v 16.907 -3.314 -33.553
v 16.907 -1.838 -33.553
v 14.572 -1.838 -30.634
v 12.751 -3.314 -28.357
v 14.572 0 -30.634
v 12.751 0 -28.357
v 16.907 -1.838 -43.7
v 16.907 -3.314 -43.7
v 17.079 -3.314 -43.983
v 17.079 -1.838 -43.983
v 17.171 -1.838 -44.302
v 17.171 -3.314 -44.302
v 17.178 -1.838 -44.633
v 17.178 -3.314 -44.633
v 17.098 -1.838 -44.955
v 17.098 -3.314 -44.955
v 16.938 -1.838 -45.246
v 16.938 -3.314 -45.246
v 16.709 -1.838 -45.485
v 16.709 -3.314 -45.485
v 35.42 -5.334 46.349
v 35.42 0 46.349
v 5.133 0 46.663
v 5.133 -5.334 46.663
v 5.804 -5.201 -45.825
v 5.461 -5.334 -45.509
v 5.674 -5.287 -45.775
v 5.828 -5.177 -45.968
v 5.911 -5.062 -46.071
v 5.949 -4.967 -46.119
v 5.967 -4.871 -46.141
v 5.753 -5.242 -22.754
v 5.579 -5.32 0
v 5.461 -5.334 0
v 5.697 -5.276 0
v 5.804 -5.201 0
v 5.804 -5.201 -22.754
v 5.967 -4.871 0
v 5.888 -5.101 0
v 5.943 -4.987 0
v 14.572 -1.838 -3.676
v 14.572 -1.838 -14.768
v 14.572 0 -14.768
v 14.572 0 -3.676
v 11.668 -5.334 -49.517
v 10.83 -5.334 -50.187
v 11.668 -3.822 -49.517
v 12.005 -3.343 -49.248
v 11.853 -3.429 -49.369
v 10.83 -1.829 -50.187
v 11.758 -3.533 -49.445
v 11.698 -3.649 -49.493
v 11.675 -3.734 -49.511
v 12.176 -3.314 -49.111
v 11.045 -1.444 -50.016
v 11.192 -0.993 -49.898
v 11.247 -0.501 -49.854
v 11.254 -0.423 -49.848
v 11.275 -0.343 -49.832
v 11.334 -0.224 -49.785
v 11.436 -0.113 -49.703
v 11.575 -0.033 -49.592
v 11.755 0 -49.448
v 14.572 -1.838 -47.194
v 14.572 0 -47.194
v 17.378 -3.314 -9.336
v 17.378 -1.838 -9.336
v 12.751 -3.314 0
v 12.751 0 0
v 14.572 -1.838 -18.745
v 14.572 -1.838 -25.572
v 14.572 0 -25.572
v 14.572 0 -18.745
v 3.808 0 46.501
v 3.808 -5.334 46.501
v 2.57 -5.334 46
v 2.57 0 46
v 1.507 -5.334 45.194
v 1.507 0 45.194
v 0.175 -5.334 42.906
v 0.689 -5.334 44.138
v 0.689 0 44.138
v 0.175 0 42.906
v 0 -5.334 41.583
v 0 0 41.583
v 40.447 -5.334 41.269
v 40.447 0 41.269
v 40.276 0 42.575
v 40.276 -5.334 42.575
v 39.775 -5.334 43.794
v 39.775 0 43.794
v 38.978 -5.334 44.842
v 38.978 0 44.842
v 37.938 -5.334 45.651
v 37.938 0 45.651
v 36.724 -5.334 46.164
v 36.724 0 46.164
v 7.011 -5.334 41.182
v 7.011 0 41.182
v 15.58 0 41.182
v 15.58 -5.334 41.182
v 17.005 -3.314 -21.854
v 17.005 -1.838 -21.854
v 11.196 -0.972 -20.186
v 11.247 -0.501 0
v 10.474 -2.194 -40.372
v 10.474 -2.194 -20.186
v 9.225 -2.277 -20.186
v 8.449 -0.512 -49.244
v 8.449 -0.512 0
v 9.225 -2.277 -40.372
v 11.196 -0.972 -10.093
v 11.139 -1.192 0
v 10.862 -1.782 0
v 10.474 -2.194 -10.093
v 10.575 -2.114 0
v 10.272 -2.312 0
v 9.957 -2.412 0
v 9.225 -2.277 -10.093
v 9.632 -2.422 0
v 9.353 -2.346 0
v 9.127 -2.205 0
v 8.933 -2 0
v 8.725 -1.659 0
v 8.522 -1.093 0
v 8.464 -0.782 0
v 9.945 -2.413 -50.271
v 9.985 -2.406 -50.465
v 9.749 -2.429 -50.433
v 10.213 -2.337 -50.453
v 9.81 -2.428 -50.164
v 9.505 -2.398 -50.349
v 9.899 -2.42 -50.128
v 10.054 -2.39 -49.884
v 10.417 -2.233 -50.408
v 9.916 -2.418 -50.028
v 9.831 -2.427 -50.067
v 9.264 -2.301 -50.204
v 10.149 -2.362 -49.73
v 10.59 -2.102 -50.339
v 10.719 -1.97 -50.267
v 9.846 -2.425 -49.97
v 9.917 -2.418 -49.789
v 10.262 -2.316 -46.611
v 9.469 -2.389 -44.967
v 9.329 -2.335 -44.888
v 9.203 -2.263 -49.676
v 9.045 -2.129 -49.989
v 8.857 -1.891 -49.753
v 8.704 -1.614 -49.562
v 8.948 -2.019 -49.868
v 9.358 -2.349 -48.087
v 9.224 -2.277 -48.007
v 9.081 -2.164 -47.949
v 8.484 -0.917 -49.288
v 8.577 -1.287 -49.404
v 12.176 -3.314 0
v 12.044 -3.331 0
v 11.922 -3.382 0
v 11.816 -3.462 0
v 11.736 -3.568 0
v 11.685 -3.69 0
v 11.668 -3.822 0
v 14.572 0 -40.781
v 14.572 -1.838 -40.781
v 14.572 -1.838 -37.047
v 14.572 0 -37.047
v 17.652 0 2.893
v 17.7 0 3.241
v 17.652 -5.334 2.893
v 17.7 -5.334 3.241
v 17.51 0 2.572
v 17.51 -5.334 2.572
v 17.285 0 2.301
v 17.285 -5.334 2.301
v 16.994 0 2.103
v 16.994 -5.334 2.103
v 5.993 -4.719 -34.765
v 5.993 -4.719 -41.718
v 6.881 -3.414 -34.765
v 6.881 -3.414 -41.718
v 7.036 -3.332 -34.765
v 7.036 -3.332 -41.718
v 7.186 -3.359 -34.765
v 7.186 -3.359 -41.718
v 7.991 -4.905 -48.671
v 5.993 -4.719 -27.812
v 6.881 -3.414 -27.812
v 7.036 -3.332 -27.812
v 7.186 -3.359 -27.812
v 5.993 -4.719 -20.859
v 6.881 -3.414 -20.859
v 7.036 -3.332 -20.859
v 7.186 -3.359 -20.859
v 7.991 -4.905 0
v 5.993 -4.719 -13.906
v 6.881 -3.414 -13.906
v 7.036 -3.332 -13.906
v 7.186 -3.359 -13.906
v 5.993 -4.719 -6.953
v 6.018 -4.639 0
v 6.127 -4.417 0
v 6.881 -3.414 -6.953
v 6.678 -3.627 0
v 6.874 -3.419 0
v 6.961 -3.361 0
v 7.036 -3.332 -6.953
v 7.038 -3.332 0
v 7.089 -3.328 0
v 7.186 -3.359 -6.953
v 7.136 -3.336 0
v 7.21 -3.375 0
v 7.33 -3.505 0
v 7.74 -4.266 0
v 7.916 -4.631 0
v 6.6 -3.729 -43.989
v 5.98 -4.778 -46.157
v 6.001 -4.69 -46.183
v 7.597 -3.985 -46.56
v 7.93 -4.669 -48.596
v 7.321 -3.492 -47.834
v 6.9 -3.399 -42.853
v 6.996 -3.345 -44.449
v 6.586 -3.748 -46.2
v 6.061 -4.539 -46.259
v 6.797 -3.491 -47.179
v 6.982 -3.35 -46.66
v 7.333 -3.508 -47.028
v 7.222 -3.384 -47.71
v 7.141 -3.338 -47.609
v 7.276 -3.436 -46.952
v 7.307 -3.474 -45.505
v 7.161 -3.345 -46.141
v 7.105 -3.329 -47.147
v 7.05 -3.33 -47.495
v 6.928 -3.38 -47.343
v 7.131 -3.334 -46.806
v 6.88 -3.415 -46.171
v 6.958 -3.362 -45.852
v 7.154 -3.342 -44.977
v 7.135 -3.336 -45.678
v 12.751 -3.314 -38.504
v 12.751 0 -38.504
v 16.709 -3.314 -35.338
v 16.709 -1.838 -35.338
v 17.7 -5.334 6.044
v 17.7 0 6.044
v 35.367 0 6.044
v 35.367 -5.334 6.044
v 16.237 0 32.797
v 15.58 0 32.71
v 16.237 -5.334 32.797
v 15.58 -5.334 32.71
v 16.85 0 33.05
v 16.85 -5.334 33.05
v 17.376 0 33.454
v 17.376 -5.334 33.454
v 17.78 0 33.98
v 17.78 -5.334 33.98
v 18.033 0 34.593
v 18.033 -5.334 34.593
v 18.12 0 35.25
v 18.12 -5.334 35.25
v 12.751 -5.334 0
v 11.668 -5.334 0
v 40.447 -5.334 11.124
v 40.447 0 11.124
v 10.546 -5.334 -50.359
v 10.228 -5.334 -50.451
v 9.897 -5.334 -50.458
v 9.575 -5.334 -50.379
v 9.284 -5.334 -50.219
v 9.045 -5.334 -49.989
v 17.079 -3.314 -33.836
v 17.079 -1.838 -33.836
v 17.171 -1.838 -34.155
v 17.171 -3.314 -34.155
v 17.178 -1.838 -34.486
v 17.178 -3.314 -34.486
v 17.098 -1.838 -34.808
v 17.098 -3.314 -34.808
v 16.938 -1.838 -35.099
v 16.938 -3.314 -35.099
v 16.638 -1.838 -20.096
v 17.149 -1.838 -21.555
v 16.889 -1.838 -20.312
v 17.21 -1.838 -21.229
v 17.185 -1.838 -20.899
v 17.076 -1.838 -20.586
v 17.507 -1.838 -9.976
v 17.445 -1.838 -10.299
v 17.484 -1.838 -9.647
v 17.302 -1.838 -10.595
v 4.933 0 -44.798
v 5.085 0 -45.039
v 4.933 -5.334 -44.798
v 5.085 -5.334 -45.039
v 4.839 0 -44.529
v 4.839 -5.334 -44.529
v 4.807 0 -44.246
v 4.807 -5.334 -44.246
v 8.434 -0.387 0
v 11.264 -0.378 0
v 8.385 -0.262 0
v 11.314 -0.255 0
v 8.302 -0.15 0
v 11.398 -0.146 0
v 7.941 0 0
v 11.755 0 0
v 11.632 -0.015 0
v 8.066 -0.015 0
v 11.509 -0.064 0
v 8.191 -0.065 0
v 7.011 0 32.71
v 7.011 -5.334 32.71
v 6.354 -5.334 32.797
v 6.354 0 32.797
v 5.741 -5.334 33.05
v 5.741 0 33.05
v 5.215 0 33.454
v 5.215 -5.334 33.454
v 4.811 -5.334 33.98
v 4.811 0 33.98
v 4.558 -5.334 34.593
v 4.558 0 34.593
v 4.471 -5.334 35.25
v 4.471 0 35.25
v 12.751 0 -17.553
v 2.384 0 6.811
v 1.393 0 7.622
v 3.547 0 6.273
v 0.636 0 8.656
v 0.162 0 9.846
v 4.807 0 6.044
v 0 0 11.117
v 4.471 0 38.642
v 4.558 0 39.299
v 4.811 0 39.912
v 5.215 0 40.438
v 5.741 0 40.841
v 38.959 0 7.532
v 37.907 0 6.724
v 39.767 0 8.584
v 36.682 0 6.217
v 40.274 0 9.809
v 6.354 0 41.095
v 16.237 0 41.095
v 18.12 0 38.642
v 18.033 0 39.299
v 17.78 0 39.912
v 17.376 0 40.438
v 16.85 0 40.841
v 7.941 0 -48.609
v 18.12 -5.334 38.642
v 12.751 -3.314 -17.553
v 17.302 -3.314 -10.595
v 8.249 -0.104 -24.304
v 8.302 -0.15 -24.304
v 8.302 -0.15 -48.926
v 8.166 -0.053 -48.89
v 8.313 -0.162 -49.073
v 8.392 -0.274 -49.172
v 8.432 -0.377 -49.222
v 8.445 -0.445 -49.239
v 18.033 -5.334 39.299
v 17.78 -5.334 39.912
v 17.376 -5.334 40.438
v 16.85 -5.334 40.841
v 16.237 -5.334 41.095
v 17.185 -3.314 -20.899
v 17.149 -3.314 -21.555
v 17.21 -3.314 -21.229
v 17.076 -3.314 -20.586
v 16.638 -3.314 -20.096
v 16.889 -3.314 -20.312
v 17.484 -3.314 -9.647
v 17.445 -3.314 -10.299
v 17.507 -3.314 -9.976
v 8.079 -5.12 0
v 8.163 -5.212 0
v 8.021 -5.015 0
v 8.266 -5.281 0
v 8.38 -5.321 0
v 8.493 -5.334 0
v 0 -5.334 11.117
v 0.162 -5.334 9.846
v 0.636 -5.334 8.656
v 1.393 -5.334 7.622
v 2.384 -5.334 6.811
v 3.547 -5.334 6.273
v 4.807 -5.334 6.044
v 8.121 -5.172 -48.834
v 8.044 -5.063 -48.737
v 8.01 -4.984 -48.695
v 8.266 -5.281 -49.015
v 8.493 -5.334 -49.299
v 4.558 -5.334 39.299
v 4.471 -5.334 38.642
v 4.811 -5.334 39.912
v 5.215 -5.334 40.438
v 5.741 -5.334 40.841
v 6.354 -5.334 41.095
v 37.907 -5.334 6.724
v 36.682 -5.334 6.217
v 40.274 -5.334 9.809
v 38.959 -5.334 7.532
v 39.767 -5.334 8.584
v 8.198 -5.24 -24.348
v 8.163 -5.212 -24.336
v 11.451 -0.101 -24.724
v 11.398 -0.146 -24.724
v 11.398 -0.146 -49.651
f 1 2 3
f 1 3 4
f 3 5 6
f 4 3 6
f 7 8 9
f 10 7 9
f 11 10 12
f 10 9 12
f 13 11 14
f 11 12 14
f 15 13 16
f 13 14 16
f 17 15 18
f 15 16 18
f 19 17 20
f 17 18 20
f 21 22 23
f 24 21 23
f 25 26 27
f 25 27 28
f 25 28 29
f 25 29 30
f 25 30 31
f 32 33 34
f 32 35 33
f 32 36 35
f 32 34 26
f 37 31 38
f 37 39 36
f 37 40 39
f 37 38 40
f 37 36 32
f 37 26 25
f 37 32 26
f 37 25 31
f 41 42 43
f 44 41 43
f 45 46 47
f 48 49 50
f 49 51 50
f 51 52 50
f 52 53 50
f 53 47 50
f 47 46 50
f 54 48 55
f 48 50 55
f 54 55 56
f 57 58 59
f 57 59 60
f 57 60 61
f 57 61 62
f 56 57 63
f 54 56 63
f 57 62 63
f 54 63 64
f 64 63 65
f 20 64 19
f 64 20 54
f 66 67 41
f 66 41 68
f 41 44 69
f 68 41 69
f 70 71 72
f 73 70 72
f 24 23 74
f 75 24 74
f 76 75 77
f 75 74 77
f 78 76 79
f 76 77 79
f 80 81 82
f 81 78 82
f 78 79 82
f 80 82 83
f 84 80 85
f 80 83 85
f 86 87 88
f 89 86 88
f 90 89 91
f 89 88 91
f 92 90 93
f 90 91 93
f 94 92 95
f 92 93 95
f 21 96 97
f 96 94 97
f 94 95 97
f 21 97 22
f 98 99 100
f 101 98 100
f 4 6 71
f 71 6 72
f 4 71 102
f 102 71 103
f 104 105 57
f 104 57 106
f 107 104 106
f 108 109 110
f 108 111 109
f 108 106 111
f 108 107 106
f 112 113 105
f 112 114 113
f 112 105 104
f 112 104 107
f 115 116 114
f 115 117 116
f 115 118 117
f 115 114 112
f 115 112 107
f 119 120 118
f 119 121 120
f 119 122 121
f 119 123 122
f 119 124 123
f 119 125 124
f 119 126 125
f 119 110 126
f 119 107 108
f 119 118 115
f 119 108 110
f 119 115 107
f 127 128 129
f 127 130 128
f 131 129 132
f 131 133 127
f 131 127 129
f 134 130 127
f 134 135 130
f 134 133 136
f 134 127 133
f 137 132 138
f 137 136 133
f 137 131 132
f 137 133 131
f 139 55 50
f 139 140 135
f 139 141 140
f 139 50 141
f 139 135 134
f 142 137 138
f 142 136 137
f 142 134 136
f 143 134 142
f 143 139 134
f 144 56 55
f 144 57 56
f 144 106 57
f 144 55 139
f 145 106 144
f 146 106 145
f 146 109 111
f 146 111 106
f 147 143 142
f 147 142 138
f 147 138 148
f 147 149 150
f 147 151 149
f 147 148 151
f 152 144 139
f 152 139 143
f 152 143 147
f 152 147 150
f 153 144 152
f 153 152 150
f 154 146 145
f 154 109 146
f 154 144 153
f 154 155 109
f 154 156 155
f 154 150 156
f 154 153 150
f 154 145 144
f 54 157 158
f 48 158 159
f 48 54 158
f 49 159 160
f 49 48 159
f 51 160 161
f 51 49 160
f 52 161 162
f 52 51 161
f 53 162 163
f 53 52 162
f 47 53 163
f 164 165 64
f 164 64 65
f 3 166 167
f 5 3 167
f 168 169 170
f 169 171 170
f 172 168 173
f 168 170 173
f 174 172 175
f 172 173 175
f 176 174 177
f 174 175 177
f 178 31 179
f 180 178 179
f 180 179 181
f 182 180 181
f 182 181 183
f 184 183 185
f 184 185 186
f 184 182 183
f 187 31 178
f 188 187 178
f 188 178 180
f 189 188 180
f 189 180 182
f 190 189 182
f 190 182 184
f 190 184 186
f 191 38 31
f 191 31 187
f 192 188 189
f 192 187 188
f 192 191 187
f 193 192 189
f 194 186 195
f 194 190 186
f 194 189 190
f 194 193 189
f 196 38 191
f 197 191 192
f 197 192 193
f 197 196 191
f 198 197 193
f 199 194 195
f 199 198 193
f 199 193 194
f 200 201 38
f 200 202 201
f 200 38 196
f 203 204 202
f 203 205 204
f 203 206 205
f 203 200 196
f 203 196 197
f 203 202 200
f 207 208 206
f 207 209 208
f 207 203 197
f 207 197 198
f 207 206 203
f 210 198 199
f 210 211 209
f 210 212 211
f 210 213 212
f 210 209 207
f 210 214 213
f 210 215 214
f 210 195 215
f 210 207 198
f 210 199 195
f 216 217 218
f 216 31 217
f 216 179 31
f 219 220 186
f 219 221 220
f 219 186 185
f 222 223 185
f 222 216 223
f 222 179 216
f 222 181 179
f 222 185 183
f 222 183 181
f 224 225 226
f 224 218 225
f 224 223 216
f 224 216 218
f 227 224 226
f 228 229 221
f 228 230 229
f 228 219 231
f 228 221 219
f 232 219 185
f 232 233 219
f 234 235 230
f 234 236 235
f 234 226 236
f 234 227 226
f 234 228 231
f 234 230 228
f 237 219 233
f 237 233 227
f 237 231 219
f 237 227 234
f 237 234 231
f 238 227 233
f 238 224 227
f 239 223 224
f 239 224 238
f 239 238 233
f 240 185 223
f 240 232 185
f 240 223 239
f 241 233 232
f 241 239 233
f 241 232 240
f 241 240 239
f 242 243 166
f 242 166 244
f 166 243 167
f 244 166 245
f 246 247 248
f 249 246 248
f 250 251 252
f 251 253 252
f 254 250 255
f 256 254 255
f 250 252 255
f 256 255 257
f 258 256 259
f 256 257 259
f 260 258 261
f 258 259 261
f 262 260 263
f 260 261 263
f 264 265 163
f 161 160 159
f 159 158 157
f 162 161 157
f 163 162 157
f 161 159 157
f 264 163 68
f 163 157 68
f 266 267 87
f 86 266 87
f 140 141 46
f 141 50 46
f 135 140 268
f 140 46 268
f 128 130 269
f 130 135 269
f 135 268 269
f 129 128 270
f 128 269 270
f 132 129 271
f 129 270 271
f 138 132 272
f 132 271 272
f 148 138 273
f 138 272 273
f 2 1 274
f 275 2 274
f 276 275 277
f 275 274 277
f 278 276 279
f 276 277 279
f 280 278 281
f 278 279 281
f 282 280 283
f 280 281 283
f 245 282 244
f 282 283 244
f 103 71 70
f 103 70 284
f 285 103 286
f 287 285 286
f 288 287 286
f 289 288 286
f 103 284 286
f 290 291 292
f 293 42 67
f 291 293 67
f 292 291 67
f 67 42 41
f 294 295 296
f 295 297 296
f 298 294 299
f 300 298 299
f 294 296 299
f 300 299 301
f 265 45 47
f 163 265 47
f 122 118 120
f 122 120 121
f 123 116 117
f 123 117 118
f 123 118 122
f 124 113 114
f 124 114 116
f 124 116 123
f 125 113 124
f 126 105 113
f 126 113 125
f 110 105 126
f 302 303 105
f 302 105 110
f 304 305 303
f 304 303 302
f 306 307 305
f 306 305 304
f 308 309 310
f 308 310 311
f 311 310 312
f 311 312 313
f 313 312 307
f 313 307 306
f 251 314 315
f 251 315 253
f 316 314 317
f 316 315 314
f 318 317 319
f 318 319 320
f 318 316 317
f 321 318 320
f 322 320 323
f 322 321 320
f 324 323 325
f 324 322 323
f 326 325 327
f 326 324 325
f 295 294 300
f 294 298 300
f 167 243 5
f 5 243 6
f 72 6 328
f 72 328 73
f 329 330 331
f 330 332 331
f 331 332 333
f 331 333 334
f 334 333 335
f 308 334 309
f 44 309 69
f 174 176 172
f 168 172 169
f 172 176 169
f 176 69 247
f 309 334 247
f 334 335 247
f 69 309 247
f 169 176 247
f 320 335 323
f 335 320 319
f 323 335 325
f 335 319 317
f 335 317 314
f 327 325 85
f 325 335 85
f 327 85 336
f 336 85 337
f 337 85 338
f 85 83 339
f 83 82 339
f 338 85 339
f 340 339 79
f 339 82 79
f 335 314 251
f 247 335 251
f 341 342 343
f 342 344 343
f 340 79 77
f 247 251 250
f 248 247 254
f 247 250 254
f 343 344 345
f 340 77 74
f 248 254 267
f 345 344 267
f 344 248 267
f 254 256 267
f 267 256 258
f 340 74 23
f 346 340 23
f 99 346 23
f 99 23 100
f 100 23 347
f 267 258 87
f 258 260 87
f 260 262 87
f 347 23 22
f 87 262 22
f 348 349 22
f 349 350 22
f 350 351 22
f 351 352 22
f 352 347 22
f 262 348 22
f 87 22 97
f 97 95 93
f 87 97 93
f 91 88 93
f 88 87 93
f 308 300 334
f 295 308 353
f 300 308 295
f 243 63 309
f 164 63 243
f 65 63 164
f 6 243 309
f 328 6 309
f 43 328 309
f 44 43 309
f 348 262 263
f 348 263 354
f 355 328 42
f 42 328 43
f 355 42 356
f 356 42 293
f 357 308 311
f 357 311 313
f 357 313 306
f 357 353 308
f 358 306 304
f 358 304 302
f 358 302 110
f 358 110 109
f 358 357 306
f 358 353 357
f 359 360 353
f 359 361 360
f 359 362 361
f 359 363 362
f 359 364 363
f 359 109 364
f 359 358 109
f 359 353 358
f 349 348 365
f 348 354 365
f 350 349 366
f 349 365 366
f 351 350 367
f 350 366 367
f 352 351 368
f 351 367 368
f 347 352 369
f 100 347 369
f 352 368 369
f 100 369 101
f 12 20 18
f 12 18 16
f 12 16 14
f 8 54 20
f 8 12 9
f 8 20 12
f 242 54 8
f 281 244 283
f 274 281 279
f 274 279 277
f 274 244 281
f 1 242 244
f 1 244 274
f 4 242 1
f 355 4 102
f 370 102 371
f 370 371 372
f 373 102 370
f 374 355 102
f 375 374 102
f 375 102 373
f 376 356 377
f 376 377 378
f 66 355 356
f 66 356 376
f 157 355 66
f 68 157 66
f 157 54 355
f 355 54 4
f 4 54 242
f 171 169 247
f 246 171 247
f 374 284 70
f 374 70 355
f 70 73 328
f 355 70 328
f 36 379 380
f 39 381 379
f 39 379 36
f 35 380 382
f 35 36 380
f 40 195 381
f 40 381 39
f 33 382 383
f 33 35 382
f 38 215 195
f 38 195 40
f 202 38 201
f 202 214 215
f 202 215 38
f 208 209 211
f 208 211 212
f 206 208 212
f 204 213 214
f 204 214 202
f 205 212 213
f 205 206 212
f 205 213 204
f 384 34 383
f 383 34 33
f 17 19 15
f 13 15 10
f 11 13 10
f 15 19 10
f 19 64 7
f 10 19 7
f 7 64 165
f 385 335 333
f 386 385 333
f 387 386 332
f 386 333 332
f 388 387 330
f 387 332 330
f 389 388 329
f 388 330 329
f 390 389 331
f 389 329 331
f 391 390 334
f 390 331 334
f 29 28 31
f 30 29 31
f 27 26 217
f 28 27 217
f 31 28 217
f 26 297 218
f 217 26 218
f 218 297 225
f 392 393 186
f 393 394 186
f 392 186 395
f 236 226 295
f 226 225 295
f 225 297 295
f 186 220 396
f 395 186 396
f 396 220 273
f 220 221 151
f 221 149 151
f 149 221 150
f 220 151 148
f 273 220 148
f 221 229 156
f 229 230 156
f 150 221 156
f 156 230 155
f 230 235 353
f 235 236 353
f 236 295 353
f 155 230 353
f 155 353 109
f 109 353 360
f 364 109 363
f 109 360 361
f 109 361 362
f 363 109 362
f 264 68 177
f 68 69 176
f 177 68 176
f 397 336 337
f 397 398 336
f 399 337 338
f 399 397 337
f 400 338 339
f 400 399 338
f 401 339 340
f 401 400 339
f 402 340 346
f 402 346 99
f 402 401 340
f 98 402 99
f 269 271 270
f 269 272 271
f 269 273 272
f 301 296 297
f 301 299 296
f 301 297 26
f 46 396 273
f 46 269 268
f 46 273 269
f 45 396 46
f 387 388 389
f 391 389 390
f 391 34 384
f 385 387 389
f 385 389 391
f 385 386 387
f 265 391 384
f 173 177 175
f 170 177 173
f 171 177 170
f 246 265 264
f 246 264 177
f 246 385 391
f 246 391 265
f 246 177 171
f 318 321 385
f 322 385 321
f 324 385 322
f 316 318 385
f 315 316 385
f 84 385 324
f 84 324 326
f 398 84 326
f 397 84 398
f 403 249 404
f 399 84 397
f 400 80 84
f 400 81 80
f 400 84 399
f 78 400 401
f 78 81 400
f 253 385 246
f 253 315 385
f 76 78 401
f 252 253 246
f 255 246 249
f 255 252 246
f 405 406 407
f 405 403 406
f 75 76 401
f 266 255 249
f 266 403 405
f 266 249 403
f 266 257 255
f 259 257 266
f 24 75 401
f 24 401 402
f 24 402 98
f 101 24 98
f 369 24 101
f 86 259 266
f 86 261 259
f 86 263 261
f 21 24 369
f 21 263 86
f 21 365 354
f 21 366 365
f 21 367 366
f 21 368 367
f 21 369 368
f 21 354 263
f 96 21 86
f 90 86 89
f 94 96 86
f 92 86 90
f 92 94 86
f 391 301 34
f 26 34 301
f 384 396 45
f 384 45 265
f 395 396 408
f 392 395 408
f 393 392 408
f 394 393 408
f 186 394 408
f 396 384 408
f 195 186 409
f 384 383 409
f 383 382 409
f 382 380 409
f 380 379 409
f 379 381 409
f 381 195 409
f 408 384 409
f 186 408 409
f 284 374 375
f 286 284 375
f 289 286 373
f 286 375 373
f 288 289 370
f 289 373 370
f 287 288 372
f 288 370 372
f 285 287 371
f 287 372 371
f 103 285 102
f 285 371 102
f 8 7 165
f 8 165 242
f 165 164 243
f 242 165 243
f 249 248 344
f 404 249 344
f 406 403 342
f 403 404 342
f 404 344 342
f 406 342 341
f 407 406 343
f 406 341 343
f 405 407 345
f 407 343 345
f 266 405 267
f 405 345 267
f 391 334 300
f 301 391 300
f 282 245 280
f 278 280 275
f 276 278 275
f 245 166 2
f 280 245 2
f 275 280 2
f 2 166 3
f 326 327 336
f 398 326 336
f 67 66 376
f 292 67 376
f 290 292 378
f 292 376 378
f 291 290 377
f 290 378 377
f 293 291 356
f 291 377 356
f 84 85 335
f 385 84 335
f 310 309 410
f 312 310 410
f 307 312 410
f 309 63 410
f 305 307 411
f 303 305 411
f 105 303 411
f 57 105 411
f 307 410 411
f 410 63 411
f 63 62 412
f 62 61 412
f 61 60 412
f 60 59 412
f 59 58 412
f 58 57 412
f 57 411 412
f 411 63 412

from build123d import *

# Parameters (mm, degrees)
F0_W        = 13.6487651616
F0_H        = 8.4716491401
F1_DEPTH    = 5.334
F2_T1_DEPTH = 30.734
F2_T3_DEPTH = 30.9986733357
F2_T5_DEPTH = 30.6972722749
F2_T7_DEPTH = 30.472056174
F3_R        = 2.54
F4_R        = 1.27
F6_DEPTH    = 52.1462
F7_W        = 6.471471861
F7_H        = 2.0470987074
F8_DEPTH    = 58.928
F9_W        = 3.0602971092
F9_H        = 1.8379887333
F10_DEPTH   = 54.61
F12_DEPTH   = 55.626
F13_R       = 0.508


# Not quite as in the source:
# - a fillet or chamfer that OpenCascade refuses, or shapes differently, is made with other operations: its cross-section is extruded or revolved along the edge and cut away or added


with BuildPart() as f1:
    # F0 (on Front) → F1 (new body)
    with BuildSketch(Plane.XZ):
        Polygon((40.4473207891, 46.2965518236), (0, 46.7158481479), (0, 6.0438592918), (4.8069125041, 6.0438592918), (4.8069125041, -44.6913056076), (9.8384991288, -50.9807877243), (17.7003503195, -44.6913056076), (12.7505768579, -38.5040899258), (17.7003503195, -34.5442704236), (12.7505768579, -28.3570547418), (17.7003503195, -20.7912679762), (12.7505768579, -17.5529719363), (17.7003503195, -9.9871851707), (12.7505768579, 0), (17.7003503195, 2.4531694269), (17.7003503195, 6.0438592918), (40.4473207891, 6.0438592918), align=None)
        with Locations((11.2955300137, 36.9457956403)):
            Rectangle(F0_W, F0_H, mode=Mode.SUBTRACT)
    extrude(amount=F1_DEPTH)

    # F2: fillet of radius 5.08 on 4 edges, made by hand

    # F2_s2 → F2_t1 (cut)
    with BuildSketch(Plane.XZ.offset(-12.7)):
        with BuildLine():
            ThreePointArc((35.3673207891, 6.0438592918), (38.9594232375, 7.5317568434), (40.4473207891, 11.1238592918))
            Line((40.4473207891, 11.1238592918), (40.4473207891, 6.0438592918))
            Line((40.4473207891, 6.0438592918), (35.3673207891, 6.0438592918))
        make_face()
    extrude(amount=F2_T1_DEPTH, mode=Mode.SUBTRACT)

    # F2_s4 → F2_t3 (cut)
    with BuildSketch(Plane.XZ.offset(-12.8323366678)):
        with BuildLine():
            ThreePointArc((5.1326588868, 46.6626405444), (1.5065637787, 45.1935856581), (0, 41.5829134807))
            Line((0, 41.5829134807), (0, 46.7158481479))
            Line((0, 46.7158481479), (5.1326588868, 46.6626405444))
        make_face()
    extrude(amount=F2_T3_DEPTH, mode=Mode.SUBTRACT)

    # F2_s6 → F2_t5 (cut)
    with BuildSketch(Plane.XZ.offset(-12.6816361374)):
        with BuildLine():
            ThreePointArc((0, 11.1165137468), (1.392610376, 7.6222959859), (4.8069125041, 6.0438592918))
            Line((4.8069125041, 6.0438592918), (0, 6.0438592918))
            Line((0, 6.0438592918), (0, 11.1165137468))
        make_face()
    extrude(amount=F2_T5_DEPTH, mode=Mode.SUBTRACT)

    # F2_s8 → F2_t7 (cut)
    with BuildSketch(Plane.XZ.offset(-12.569028087)):
        with BuildLine():
            ThreePointArc((40.4473207891, 41.2689405888), (38.9779929665, 44.8423768101), (35.4199796759, 46.3486676525))
            Line((35.4199796759, 46.3486676525), (40.4473207891, 46.2965518236))
            Line((40.4473207891, 46.2965518236), (40.4473207891, 41.2689405888))
        make_face()
    extrude(amount=F2_T7_DEPTH, mode=Mode.SUBTRACT)

    # F3
    f3_edges = [f1.edges().sort_by_distance(p)[0] for p in [
        (18.119913, -2.667, 41.18162),
        (4.471147, -2.667, 41.18162),
        (4.471147, -2.667, 32.709971),
        (18.119913, -2.667, 32.709971),
    ]]
    fillet(f3_edges, radius=F3_R)

    # F4
    f4_edges = [f1.edges().sort_by_distance(p)[0] for p in [
        (17.70035, -2.667, 2.453169),
        (17.70035, -2.667, -9.987185),
        (17.70035, -2.667, -20.791268),
        (17.70035, -2.667, -34.54427),
        (17.70035, -2.667, -44.691306),
        (9.838499, -2.667, -50.980788),
        (4.806913, -2.667, -44.691306),
    ]]
    fillet(f4_edges, radius=F4_R)

    # F5 (on Top) → F6 (cut)
    with BuildSketch(Plane.XY):
        with BuildLine():
            add(Edge.make_bspline(
                [(5.9925829992, -5.3615476936), (5.9662371728, -5.1413136829), (5.9117415486, -4.685765632), (6.3531394911, -4.0979348233), (6.8182620743, -3.382318142), (7.2587507478, -3.2452825018), (7.6600250696, -4.1522550659), (8.0135536671, -4.7405594262), (8.0147180391, -5.162214979), (8.0152684823, -5.3615476936)],
                knots=[0, 0, 0, 0, 0.1405767765, 0.2907792323, 0.4524560789, 0.5501663785, 0.7152294594, 0.8653780686, 1, 1, 1, 1], degree=3))
            Line((5.9925829992, -5.3615476936), (8.0152684823, -5.3615476936))
        make_face()
    extrude(amount=-F6_DEPTH, mode=Mode.SUBTRACT)

    # F7 (on Top) → F8 (cut)
    with BuildSketch(Plane.XY):
        with Locations((14.903399162, -4.3372439686)):
            Rectangle(F7_W, F7_H)
    extrude(amount=-F8_DEPTH, mode=Mode.SUBTRACT)

    # F9 (on Top) → F10 (cut)
    with BuildSketch(Plane.XY):
        with Locations((16.1025538109, -0.9189943667)):
            Rectangle(F9_W, F9_H)
    extrude(amount=-F10_DEPTH, mode=Mode.SUBTRACT)

    # F11 (on Top) → F12 (cut)
    with BuildSketch(Plane.XY):
        with BuildLine():
            add(Edge.make_bspline(
                [(11.2238610163, 0), (11.2478981656, -0.3069122797), (11.3009665063, -0.984502007), (10.6443157535, -2.3913685017), (9.025430434, -2.589119864), (8.3644189358, -0.856075456), (8.4617577104, -0.2545179476), (8.5029415786, 0)],
                knots=[0, 0, 0, 0, 0.1796332137, 0.3965876516, 0.6003917954, 0.8309264556, 1, 1, 1, 1], degree=3))
            Line((11.2238610163, 0), (8.5029415786, 0))
        make_face()
    extrude(amount=-F12_DEPTH, mode=Mode.SUBTRACT)

    # F13
    f13_edges = [f1.edges().sort_by_distance(p)[0] for p in [
        (8.015188, -5.334, -24.350824),
        (5.989293, -5.334, -23.084641),
        (11.223861, 0, -24.936249),
        (8.502942, 0, -24.655671),
        (11.667663, -3.313695, -24.758728),
    ]]
    fillet(f13_edges, radius=F13_R)


solid = f1.part
